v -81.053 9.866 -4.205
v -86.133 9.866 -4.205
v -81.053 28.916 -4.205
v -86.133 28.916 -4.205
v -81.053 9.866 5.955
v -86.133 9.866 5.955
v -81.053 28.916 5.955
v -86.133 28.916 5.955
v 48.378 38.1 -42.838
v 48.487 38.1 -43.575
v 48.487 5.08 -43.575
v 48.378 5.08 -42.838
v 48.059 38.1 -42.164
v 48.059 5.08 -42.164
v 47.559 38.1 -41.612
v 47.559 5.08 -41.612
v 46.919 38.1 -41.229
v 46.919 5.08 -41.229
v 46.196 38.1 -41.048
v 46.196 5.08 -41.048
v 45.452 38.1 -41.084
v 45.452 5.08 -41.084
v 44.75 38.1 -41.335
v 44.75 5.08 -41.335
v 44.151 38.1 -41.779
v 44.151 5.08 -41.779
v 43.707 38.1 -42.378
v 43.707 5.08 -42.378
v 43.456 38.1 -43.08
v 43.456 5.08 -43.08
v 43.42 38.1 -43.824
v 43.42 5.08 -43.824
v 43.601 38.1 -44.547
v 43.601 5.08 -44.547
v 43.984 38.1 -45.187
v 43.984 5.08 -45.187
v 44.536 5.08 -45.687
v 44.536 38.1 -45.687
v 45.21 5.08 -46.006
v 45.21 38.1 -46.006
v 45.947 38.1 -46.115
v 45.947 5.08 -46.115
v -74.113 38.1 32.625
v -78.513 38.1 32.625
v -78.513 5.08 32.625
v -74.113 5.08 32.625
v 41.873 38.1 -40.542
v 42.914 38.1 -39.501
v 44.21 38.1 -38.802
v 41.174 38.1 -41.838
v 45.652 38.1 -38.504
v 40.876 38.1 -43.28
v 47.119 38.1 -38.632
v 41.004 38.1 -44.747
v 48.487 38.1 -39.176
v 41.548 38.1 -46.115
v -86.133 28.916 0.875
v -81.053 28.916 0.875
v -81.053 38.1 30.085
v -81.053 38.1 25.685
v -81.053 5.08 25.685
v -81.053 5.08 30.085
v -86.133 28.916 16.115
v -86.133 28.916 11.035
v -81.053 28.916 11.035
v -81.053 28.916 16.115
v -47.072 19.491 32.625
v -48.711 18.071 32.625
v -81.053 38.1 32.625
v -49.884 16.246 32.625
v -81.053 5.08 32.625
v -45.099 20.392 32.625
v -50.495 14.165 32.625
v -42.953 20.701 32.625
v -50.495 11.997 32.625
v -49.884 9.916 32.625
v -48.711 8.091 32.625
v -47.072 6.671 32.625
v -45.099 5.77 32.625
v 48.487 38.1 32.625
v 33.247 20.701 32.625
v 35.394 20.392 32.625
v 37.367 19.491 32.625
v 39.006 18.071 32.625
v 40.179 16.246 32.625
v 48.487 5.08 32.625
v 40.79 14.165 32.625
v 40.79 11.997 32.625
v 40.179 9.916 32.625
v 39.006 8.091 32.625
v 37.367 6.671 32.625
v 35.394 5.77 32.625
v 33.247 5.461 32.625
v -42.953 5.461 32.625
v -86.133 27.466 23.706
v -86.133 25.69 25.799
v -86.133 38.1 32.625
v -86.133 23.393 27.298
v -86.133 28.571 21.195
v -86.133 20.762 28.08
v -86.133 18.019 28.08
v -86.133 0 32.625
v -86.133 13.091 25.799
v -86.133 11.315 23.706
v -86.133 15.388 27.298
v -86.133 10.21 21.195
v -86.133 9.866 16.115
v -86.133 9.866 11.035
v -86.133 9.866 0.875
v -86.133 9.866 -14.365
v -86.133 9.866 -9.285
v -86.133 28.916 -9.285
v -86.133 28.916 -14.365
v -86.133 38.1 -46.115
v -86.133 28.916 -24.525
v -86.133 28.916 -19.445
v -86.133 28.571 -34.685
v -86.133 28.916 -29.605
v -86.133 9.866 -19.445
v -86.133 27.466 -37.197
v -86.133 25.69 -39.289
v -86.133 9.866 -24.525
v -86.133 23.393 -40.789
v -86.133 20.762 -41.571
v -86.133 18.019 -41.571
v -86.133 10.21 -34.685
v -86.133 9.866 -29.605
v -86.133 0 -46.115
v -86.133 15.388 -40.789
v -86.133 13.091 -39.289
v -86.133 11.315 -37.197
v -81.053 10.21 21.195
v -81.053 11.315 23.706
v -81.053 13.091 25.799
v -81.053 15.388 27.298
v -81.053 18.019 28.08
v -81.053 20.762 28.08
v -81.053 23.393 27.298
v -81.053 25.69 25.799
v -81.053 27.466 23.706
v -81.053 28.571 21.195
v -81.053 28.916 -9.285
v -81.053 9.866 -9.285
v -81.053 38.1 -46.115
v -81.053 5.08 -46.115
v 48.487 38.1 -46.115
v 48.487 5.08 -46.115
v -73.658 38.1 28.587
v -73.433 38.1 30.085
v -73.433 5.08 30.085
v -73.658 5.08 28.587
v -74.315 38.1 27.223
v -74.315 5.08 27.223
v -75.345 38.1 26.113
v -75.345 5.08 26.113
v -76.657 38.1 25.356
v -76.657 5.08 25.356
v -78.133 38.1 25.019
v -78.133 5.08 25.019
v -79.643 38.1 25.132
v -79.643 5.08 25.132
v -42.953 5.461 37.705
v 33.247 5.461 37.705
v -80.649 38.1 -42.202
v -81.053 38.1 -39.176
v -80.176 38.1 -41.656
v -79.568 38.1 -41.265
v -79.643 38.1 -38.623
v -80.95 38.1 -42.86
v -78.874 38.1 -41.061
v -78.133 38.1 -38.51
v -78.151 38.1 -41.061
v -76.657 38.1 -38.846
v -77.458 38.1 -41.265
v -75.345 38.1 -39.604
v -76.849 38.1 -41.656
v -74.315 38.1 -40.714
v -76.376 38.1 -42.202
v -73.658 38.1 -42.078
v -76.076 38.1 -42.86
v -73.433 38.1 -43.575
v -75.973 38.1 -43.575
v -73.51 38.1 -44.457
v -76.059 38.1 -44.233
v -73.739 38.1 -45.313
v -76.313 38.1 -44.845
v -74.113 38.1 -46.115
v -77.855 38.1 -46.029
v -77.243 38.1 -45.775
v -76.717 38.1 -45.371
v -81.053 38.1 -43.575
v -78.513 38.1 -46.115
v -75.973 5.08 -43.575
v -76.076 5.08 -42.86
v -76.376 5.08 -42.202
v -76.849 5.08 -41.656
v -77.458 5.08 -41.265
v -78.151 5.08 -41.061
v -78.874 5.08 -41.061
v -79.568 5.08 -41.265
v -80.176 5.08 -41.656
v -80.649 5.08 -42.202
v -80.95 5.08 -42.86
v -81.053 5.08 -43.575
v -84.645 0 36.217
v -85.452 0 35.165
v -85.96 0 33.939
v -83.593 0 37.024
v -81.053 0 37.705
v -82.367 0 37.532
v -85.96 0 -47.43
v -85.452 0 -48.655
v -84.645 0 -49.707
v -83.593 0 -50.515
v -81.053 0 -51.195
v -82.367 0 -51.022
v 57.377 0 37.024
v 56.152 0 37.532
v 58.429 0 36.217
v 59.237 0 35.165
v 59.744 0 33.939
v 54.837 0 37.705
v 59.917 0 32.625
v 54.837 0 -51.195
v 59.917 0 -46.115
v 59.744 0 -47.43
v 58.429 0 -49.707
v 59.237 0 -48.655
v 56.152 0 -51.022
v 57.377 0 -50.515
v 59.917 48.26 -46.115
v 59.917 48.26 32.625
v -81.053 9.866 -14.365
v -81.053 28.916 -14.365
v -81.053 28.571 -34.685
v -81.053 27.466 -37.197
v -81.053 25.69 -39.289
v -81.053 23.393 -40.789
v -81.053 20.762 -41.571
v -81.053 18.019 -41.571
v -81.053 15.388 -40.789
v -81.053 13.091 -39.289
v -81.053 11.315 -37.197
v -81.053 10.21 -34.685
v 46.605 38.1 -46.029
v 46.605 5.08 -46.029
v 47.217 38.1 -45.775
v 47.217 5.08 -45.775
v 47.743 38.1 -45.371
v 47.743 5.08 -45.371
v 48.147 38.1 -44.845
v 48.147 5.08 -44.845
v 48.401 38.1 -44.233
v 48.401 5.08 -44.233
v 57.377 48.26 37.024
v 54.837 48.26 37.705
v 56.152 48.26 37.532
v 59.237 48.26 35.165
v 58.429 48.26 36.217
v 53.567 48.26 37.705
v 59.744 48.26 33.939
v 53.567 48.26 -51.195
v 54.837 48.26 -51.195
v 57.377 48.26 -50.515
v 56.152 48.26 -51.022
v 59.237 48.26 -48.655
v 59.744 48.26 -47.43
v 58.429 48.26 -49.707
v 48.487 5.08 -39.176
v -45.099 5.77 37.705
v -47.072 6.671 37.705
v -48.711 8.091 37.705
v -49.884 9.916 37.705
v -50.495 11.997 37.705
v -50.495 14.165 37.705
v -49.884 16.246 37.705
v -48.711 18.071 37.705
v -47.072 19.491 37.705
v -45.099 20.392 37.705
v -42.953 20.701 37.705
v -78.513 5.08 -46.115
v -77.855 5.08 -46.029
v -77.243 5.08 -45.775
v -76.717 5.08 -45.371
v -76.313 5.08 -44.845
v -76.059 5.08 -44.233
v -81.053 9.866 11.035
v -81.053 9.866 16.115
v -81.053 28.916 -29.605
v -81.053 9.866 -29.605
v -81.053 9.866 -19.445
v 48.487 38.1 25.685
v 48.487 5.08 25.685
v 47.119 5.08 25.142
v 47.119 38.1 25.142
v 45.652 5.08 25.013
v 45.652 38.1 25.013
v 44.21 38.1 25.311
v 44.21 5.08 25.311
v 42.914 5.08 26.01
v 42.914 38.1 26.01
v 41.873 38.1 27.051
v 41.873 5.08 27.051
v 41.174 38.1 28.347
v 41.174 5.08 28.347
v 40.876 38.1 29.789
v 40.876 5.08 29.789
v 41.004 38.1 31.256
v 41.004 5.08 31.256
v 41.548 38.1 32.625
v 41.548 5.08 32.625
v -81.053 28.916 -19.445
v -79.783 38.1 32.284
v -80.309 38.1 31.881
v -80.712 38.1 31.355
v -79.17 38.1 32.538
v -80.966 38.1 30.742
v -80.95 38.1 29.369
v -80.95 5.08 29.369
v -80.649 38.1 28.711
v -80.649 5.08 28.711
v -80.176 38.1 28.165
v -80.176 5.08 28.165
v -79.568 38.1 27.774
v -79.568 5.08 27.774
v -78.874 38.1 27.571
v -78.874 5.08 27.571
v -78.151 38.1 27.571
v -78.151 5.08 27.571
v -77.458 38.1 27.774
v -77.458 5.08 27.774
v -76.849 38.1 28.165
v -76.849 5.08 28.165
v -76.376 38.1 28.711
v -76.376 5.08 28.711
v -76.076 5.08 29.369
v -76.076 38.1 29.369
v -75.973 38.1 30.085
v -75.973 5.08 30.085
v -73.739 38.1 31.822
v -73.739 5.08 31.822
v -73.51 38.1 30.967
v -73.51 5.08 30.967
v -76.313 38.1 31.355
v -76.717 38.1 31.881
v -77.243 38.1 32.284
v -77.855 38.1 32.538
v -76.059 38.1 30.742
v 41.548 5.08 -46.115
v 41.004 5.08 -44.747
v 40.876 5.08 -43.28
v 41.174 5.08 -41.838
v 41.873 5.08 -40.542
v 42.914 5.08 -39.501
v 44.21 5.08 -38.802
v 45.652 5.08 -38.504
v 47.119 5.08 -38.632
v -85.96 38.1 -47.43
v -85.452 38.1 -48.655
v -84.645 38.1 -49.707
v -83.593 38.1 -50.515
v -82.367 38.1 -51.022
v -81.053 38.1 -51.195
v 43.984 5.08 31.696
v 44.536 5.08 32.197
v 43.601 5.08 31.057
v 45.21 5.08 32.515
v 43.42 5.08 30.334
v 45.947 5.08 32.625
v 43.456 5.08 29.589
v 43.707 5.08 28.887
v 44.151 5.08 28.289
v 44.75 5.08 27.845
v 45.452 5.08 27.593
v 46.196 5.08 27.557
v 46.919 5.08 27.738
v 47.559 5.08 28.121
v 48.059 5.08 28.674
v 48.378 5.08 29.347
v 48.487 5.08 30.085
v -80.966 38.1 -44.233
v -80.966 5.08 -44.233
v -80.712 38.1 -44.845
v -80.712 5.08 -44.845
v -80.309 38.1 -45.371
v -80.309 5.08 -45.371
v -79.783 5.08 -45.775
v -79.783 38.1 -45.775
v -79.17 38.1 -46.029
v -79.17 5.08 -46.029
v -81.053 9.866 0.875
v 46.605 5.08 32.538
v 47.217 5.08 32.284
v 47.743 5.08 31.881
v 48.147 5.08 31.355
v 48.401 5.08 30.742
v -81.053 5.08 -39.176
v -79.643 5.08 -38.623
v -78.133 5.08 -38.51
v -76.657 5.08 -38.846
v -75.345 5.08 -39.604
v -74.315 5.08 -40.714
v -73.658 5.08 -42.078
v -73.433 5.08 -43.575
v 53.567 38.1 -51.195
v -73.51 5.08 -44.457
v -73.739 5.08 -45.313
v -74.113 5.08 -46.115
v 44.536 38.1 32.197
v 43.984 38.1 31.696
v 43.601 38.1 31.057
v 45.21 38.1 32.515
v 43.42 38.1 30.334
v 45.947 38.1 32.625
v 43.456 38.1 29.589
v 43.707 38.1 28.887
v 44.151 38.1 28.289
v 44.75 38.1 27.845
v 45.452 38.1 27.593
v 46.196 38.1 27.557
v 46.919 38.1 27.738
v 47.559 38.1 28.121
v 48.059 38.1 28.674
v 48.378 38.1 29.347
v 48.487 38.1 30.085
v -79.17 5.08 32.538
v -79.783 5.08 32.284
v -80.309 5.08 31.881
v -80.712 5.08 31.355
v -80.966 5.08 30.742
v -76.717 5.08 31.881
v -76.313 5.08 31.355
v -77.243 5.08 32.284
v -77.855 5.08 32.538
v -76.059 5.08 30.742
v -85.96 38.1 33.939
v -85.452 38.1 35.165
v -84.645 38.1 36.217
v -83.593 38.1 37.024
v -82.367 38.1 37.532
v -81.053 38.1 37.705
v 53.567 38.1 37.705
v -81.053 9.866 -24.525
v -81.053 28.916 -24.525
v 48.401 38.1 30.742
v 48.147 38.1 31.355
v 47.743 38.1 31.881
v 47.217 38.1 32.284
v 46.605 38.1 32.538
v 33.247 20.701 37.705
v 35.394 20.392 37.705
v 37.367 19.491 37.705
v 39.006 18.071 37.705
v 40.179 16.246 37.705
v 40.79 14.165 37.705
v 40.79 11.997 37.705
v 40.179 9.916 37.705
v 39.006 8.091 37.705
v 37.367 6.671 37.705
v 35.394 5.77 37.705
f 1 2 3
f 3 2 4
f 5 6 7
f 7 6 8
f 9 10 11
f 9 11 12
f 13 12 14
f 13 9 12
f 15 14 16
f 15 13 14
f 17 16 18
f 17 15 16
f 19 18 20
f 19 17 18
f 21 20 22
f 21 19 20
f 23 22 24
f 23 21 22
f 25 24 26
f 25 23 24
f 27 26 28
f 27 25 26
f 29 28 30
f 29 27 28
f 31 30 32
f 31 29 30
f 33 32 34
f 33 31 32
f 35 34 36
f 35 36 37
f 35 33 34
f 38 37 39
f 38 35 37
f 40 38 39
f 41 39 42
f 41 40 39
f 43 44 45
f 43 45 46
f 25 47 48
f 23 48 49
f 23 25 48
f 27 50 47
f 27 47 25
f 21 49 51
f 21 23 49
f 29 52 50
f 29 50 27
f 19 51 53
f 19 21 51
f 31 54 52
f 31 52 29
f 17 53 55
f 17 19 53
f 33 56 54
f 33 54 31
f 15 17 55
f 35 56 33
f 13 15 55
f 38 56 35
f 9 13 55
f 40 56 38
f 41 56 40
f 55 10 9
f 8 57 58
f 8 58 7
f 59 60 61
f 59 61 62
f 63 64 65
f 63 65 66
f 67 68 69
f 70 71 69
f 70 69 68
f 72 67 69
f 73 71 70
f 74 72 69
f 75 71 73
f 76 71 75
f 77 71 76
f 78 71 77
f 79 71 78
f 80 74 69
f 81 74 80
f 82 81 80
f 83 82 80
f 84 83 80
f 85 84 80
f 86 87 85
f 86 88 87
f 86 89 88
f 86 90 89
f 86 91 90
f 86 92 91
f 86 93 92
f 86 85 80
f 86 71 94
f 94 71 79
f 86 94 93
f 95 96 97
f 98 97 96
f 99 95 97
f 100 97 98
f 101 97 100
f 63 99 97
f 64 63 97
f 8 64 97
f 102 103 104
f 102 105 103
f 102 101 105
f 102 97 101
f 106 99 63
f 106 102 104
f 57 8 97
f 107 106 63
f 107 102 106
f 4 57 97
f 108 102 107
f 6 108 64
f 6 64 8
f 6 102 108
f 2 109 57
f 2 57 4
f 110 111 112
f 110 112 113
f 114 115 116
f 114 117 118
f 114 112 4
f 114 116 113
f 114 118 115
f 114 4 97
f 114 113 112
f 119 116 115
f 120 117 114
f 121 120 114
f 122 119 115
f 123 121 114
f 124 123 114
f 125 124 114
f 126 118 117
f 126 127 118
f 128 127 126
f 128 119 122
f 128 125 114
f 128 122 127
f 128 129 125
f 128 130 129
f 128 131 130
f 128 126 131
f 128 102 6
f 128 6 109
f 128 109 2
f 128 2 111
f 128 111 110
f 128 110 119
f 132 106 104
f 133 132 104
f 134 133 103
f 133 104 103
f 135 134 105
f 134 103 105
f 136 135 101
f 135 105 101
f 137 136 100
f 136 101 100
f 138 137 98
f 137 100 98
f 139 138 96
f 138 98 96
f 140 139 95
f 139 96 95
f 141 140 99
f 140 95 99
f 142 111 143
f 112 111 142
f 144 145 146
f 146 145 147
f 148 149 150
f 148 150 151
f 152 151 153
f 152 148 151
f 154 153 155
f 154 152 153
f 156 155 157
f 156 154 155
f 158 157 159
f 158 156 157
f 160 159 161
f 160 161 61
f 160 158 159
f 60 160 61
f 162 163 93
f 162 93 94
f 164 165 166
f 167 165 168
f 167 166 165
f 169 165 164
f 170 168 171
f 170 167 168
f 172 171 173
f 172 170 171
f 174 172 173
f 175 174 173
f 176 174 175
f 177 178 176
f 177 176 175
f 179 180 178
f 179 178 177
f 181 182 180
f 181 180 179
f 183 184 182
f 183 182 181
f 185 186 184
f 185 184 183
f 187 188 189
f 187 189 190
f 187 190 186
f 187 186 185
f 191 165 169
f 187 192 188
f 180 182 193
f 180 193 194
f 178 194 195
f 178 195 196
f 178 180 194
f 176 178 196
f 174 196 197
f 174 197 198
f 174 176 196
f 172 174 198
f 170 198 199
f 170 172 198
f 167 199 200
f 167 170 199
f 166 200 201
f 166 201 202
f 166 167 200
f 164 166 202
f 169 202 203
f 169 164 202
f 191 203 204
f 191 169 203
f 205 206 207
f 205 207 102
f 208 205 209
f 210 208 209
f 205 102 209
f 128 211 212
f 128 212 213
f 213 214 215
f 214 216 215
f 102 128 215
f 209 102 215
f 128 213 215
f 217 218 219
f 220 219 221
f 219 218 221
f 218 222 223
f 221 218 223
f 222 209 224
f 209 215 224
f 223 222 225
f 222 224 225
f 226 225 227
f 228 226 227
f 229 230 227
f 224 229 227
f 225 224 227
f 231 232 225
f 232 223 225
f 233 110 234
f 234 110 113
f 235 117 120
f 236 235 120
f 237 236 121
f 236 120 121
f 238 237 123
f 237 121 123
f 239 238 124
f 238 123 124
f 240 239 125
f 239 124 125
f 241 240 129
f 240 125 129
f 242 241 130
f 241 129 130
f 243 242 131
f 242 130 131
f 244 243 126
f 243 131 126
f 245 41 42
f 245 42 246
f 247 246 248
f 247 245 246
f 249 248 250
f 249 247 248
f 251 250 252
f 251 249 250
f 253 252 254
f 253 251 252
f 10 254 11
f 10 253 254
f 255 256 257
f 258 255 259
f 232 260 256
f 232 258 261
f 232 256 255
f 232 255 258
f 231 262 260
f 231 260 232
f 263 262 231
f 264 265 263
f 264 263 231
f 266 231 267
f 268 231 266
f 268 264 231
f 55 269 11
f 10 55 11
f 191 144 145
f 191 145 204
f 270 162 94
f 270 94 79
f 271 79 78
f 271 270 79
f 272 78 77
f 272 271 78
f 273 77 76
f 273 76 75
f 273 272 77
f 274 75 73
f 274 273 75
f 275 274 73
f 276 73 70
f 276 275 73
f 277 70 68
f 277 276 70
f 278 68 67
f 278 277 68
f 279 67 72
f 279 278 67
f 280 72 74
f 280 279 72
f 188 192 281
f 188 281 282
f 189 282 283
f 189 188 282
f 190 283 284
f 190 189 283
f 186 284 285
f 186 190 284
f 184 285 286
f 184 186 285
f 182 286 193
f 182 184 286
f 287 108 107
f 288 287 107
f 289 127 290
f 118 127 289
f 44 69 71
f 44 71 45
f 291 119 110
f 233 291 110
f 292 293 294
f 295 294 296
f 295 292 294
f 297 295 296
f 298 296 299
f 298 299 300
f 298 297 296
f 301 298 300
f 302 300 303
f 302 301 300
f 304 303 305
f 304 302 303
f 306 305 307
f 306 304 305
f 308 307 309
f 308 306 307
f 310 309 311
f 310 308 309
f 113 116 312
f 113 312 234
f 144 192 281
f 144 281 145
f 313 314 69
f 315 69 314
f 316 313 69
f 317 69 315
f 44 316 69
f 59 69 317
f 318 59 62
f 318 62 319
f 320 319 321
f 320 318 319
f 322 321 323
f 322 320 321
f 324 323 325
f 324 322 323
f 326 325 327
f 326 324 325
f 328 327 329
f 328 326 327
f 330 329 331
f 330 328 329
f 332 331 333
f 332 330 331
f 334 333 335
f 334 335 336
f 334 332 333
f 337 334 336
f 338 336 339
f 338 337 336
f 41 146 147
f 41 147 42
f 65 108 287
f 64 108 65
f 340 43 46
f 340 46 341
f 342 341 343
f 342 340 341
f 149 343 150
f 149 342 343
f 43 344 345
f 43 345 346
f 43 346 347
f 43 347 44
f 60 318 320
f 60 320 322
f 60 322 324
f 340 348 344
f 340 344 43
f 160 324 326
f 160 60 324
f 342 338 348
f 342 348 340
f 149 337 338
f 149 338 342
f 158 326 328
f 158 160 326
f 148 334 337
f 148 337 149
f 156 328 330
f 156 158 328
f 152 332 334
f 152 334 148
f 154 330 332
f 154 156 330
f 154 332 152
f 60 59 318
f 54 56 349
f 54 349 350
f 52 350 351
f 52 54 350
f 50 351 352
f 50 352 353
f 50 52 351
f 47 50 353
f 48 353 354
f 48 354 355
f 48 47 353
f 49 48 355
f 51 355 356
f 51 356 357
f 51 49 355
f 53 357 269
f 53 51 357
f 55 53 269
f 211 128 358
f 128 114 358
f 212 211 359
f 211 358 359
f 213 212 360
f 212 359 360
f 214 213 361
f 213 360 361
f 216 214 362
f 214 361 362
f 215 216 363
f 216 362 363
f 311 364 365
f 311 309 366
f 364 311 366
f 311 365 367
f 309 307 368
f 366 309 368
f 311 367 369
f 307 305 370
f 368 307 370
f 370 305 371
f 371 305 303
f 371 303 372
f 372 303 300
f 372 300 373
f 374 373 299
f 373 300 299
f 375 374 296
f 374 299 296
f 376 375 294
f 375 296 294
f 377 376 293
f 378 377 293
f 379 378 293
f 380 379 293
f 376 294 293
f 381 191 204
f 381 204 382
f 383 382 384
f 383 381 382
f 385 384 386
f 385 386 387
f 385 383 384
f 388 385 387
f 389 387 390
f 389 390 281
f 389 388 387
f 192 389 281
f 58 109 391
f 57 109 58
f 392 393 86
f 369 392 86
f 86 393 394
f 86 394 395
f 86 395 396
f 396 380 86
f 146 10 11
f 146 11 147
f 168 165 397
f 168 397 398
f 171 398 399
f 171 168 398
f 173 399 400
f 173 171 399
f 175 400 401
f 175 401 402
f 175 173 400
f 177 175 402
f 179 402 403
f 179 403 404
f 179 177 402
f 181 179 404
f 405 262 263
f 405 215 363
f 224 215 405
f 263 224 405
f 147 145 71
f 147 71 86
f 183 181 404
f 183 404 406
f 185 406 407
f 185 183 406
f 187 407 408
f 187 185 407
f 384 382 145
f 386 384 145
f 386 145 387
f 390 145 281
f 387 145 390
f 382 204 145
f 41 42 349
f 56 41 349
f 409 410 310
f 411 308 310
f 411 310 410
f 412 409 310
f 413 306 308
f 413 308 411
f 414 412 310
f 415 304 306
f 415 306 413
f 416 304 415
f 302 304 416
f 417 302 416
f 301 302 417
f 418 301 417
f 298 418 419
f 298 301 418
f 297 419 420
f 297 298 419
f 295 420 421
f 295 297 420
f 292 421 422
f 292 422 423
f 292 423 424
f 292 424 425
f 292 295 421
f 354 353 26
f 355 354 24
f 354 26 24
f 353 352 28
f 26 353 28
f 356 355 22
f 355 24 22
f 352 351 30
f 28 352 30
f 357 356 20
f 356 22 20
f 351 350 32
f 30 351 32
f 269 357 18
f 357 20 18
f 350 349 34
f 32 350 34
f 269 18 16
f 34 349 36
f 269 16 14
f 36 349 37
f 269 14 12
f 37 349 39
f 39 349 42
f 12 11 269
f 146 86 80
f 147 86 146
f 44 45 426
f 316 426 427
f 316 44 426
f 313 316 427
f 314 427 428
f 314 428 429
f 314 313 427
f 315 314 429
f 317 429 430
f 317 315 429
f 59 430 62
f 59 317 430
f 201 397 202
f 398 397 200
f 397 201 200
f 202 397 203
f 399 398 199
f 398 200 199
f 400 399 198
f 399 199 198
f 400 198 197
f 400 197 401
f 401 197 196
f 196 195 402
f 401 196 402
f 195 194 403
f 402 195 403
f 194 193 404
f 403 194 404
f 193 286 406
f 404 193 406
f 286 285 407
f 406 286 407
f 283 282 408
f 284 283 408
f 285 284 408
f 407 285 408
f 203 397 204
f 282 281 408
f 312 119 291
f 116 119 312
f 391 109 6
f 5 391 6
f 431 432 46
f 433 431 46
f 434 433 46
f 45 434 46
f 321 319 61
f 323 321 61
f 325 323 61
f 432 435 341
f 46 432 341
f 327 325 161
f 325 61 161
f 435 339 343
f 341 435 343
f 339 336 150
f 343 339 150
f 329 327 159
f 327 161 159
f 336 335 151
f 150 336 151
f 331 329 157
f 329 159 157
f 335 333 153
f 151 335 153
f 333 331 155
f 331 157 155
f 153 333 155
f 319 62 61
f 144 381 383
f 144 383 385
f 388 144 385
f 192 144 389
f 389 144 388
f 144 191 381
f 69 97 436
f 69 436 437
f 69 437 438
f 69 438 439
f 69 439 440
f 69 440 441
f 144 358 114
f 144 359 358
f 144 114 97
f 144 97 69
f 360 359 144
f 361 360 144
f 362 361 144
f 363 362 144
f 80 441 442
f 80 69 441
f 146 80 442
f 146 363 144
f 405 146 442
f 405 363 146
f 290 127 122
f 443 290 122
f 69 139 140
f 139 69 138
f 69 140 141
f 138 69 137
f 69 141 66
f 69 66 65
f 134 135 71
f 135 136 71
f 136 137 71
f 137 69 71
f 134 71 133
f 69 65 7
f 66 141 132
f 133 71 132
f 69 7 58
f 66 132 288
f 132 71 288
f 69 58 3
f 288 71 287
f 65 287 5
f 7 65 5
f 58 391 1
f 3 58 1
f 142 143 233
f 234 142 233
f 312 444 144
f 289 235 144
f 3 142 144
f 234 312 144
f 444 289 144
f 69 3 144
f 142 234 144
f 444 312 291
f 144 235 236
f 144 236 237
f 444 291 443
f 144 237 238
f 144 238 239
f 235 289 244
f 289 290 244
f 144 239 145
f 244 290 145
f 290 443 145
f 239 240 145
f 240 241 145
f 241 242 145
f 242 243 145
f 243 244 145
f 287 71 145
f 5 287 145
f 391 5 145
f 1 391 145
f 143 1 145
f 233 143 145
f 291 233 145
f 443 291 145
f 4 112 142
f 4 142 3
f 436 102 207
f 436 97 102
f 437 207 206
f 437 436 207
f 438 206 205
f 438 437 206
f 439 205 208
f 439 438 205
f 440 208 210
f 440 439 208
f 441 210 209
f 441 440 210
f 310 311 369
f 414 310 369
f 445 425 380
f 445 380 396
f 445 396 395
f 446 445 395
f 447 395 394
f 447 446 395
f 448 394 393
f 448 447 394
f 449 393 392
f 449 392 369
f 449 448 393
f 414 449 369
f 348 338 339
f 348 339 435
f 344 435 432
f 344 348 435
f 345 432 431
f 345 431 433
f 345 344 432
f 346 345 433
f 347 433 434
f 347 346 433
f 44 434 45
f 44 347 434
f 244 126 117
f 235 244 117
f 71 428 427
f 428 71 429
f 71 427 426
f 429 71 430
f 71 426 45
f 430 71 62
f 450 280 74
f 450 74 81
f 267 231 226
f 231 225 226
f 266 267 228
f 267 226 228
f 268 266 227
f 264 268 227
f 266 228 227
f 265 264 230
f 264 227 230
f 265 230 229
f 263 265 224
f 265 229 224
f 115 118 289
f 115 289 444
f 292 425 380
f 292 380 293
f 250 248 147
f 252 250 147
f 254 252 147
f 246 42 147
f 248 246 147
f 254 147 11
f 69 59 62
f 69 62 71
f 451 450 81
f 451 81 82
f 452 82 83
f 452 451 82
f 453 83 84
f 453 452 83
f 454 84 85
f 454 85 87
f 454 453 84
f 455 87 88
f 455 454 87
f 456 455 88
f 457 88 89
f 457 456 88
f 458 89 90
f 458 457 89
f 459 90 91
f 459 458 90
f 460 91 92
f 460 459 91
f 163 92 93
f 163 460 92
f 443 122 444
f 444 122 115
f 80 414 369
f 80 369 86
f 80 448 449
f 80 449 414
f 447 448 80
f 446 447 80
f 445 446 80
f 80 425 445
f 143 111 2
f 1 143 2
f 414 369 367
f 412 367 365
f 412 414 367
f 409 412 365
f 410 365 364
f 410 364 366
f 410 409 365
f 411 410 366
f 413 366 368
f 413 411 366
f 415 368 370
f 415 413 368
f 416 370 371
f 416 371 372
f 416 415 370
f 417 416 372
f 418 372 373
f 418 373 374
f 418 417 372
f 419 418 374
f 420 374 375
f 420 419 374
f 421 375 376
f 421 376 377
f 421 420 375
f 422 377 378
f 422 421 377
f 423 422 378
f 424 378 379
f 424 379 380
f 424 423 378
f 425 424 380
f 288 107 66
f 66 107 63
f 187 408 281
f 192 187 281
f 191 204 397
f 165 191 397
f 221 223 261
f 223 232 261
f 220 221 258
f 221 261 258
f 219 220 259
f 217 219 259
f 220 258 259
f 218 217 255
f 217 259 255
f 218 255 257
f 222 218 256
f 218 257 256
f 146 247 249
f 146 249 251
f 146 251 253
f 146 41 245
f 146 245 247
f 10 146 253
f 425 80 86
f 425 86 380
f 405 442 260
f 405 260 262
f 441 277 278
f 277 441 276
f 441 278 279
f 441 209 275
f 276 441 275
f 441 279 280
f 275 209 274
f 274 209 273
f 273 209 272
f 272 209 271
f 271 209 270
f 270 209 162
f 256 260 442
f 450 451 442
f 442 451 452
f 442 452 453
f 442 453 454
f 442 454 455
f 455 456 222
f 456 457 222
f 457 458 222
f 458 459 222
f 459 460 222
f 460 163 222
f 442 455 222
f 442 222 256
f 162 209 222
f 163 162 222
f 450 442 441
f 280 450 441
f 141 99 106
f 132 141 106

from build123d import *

# Parameters (mm, degrees)
SKETCH1_W             = 139.7
SKETCH1_H             = 88.9
BOSS_EXTRUDE1_DEPTH   = 38.1
SHELL1_T              = -5.08
SKETCH2_W             = 5.08
SKETCH2_H             = 19.05
CUT_EXTRUDE1_DEPTH    = 5.08
CUT_EXTRUDE2_DEPTH    = 5.08
BOSS_EXTRUDE2_DEPTH   = 33.02
BOSS_EXTRUDE2_2_DEPTH = 33.02
BOSS_EXTRUDE2_3_DEPTH = 33.02
BOSS_EXTRUDE2_4_DEPTH = 33.02
BOSS_EXTRUDE2_5_DEPTH = 33.02
BOSS_EXTRUDE2_6_DEPTH = 33.02
BOSS_EXTRUDE2_7_DEPTH = 33.02
BOSS_EXTRUDE2_8_DEPTH = 33.02
SKETCH5_W             = 6.35
SKETCH5_H             = 88.9
BOSS_EXTRUDE3_DEPTH   = 38.1
SKETCH6_W             = 6.35
SKETCH6_H             = 88.9
BOSS_EXTRUDE4_DEPTH   = 10.16
FILLET1_R             = 5.08


with BuildPart() as part:
    # Sketch1 → Boss-Extrude1 (new body)
    with BuildSketch(Plane(origin=(0, 0, 0), x_dir=(1, 0, 0), z_dir=(0, 1, 0))):
        with Locations((-16.282684825, 6.745330739)):
            Rectangle(SKETCH1_W, SKETCH1_H)
    extrude(amount=BOSS_EXTRUDE1_DEPTH)

    # Shell1
    shell1_openings = [part.faces().sort_by_distance(p)[0] for p in [
        (-16.282684825, 38.1, -6.745330739),
    ]]
    offset(amount=SHELL1_T, openings=shell1_openings, kind=Kind.INTERSECTION)

    # Sketch2 → Cut-Extrude1 (cut)
    with BuildSketch(Plane.ZY.offset(86.132684825)):
        with BuildLine():
            Line((-34.685330739, 10.210424953), (-34.685330739, 28.570601967))
            ThreePointArc((-34.685330739, 28.570601967), (-41.670330739, 19.39051346), (-34.685330739, 10.210424953))
        make_face()
        with Locations((-27.065330739, 19.39051346)):
            Rectangle(SKETCH2_W, SKETCH2_H)
        with Locations((-16.905330739, 19.39051346)):
            Rectangle(SKETCH2_W, SKETCH2_H)
        with Locations((-6.745330739, 19.39051346)):
            Rectangle(SKETCH2_W, SKETCH2_H)
        with Locations((3.414669261, 19.39051346)):
            Rectangle(SKETCH2_W, SKETCH2_H)
        with Locations((13.574669261, 19.39051346)):
            Rectangle(SKETCH2_W, SKETCH2_H)
        with BuildLine():
            ThreePointArc((21.194669261, 10.210424953), (28.179669261, 19.39051346), (21.194669261, 28.570601967))
            Line((21.194669261, 28.570601967), (21.194669261, 10.210424953))
        make_face()
    extrude(amount=-CUT_EXTRUDE1_DEPTH, mode=Mode.SUBTRACT)

    # Sketch3 → Cut-Extrude2 (cut)
    with BuildSketch(Plane.XY.offset(37.704669261)):
        with BuildLine():
            Line((33.247315175, 5.461), (-42.952684825, 5.461))
            ThreePointArc((-42.952684825, 5.461), (-50.572684825, 13.081), (-42.952684825, 20.701))
            Line((-42.952684825, 20.701), (33.247315175, 20.701))
            ThreePointArc((33.247315175, 20.701), (40.867315175, 13.081), (33.247315175, 5.461))
        make_face()
    extrude(amount=-CUT_EXTRUDE2_DEPTH, mode=Mode.SUBTRACT)

    # Sketch5 → Boss-Extrude3 (add)
    with BuildSketch(Plane(origin=(0, 38.1, 0), x_dir=(1, 0, 0), z_dir=(0, 1, 0))):
        with Locations((56.742315175, 6.745330739)):
            Rectangle(SKETCH5_W, SKETCH5_H)
    extrude(amount=-BOSS_EXTRUDE3_DEPTH)

    # Sketch6 → Boss-Extrude4 (add)
    with BuildSketch(Plane(origin=(0, 38.1, 0), x_dir=(1, 0, 0), z_dir=(0, 1, 0))):
        with Locations((56.742315175, 6.745330739)):
            Rectangle(SKETCH6_W, SKETCH6_H)
    extrude(amount=BOSS_EXTRUDE4_DEPTH)

    # Fillet1
    fillet1_edges = [part.edges().sort_by_distance(p)[0] for p in [
        (59.917315175, 24.13, -51.195330739),
        (59.917315175, 24.13, 37.704669261),
        (-86.132684825, 19.05, -51.195330739),
        (-86.132684825, 19.05, 37.704669261),
    ]]
    fillet(fillet1_edges, radius=FILLET1_R)


with BuildPart() as body_2:
    # Sketch4 → Boss-Extrude2 (new body)
    with BuildSketch(Plane(origin=(0, 38.1, 0), x_dir=(1, 0, 0), z_dir=(0, 1, 0))):
        with BuildLine():
            Line((48.487315175, 46.115330739), (45.947315175, 46.115330739))
            ThreePointArc((45.947315175, 46.115330739), (47.743366399, 45.371381964), (48.487315175, 43.575330739))
            Line((48.487315175, 43.575330739), (48.487315175, 46.115330739))
        make_face()
    extrude(amount=-BOSS_EXTRUDE2_DEPTH)


with BuildPart() as body_3:
    # Sketch4 → Boss-Extrude2 2 (new body)
    with BuildSketch(Plane(origin=(0, 38.1, 0), x_dir=(1, 0, 0), z_dir=(0, 1, 0))):
        with BuildLine():
            Line((45.947315175, 46.115330739), (41.547906124, 46.115330739))
            ThreePointArc((41.547906124, 46.115330739), (42.355212727, 39.983228291), (48.487315175, 39.175921688))
            Line((48.487315175, 39.175921688), (48.487315175, 43.575330739))
            ThreePointArc((48.487315175, 43.575330739), (44.151263951, 41.779279515), (45.947315175, 46.115330739))
        make_face()
    extrude(amount=-BOSS_EXTRUDE2_2_DEPTH)


with BuildPart() as body_4:
    # Sketch4 → Boss-Extrude2 3 (new body)
    with BuildSketch(Plane(origin=(0, 38.1, 0), x_dir=(1, 0, 0), z_dir=(0, 1, 0))):
        with BuildLine():
            Line((48.487315175, -32.624669261), (48.487315175, -30.084669261))
            ThreePointArc((48.487315175, -30.084669261), (47.743366399, -31.880720485), (45.947315175, -32.624669261))
            Line((45.947315175, -32.624669261), (48.487315175, -32.624669261))
        make_face()
    extrude(amount=-BOSS_EXTRUDE2_3_DEPTH)


with BuildPart() as body_5:
    # Sketch4 → Boss-Extrude2 4 (new body)
    with BuildSketch(Plane(origin=(0, 38.1, 0), x_dir=(1, 0, 0), z_dir=(0, 1, 0))):
        with BuildLine():
            Line((48.487315175, -30.084669261), (48.487315175, -25.685260209))
            ThreePointArc((48.487315175, -25.685260209), (42.355212727, -26.492566812), (41.547906124, -32.624669261))
            Line((41.547906124, -32.624669261), (45.947315175, -32.624669261))
            ThreePointArc((45.947315175, -32.624669261), (44.151263951, -28.288618036), (48.487315175, -30.084669261))
        make_face()
    extrude(amount=-BOSS_EXTRUDE2_4_DEPTH)


with BuildPart() as body_6:
    # Sketch4 → Boss-Extrude2 5 (new body)
    with BuildSketch(Plane(origin=(0, 38.1, 0), x_dir=(1, 0, 0), z_dir=(0, 1, 0))):
        with BuildLine():
            ThreePointArc((-78.512684916, -32.624669261), (-80.308736081, -31.880720453), (-81.052684825, -30.084669261))
            Line((-81.052684825, -30.084669261), (-81.052684825, -32.624669261))
            Line((-81.052684825, -32.624669261), (-78.512684916, -32.624669261))
        make_face()
    extrude(amount=-BOSS_EXTRUDE2_5_DEPTH)


with BuildPart() as body_7:
    # Sketch4 → Boss-Extrude2 6 (new body)
    with BuildSketch(Plane(origin=(0, 38.1, 0), x_dir=(1, 0, 0), z_dir=(0, 1, 0))):
        with BuildLine():
            ThreePointArc((-73.432684825, -30.084669261), (-75.972684825, -25.685260209), (-81.052684825, -25.685260209))
            Line((-81.052684825, -25.685260209), (-81.052684825, -30.084669261))
            ThreePointArc((-81.052684825, -30.084669261), (-78.512684825, -27.544669261), (-75.972684825, -30.084669261))
            ThreePointArc((-75.972684825, -30.084669261), (-76.716633633, -31.880720517), (-78.512684916, -32.624669261))
            Line((-78.512684916, -32.624669261), (-74.113275774, -32.624669261))
            ThreePointArc((-74.113275774, -32.624669261), (-73.605781627, -31.39947001), (-73.432684825, -30.084669261))
        make_face()
    extrude(amount=-BOSS_EXTRUDE2_6_DEPTH)


with BuildPart() as body_8:
    # Sketch4 → Boss-Extrude2 7 (new body)
    with BuildSketch(Plane(origin=(0, 38.1, 0), x_dir=(1, 0, 0), z_dir=(0, 1, 0))):
        with BuildLine():
            ThreePointArc((-81.052684825, 43.575330739), (-80.308736057, 45.371381956), (-78.512684847, 46.115330739))
            Line((-78.512684847, 46.115330739), (-81.052684825, 46.115330739))
            Line((-81.052684825, 46.115330739), (-81.052684825, 43.575330739))
        make_face()
    extrude(amount=-BOSS_EXTRUDE2_7_DEPTH)


with BuildPart() as body_9:
    # Sketch4 → Boss-Extrude2 8 (new body)
    with BuildSketch(Plane(origin=(0, 38.1, 0), x_dir=(1, 0, 0), z_dir=(0, 1, 0))):
        with BuildLine():
            ThreePointArc((-78.512684847, 46.115330739), (-76.716633608, 45.371381971), (-75.972684825, 43.575330739))
            ThreePointArc((-75.972684825, 43.575330739), (-78.512684825, 41.035330739), (-81.052684825, 43.575330739))
            Line((-81.052684825, 43.575330739), (-81.052684825, 39.175921688))
            ThreePointArc((-81.052684825, 39.175921688), (-75.972684825, 39.175921688), (-73.432684825, 43.575330739))
            ThreePointArc((-73.432684825, 43.575330739), (-73.605781627, 44.890131488), (-74.113275774, 46.115330739))
            Line((-74.113275774, 46.115330739), (-78.512684847, 46.115330739))
        make_face()
    extrude(amount=-BOSS_EXTRUDE2_8_DEPTH)


solid = Compound([part.part, body_2.part, body_3.part, body_4.part, body_5.part, body_6.part, body_7.part, body_8.part, body_9.part])
